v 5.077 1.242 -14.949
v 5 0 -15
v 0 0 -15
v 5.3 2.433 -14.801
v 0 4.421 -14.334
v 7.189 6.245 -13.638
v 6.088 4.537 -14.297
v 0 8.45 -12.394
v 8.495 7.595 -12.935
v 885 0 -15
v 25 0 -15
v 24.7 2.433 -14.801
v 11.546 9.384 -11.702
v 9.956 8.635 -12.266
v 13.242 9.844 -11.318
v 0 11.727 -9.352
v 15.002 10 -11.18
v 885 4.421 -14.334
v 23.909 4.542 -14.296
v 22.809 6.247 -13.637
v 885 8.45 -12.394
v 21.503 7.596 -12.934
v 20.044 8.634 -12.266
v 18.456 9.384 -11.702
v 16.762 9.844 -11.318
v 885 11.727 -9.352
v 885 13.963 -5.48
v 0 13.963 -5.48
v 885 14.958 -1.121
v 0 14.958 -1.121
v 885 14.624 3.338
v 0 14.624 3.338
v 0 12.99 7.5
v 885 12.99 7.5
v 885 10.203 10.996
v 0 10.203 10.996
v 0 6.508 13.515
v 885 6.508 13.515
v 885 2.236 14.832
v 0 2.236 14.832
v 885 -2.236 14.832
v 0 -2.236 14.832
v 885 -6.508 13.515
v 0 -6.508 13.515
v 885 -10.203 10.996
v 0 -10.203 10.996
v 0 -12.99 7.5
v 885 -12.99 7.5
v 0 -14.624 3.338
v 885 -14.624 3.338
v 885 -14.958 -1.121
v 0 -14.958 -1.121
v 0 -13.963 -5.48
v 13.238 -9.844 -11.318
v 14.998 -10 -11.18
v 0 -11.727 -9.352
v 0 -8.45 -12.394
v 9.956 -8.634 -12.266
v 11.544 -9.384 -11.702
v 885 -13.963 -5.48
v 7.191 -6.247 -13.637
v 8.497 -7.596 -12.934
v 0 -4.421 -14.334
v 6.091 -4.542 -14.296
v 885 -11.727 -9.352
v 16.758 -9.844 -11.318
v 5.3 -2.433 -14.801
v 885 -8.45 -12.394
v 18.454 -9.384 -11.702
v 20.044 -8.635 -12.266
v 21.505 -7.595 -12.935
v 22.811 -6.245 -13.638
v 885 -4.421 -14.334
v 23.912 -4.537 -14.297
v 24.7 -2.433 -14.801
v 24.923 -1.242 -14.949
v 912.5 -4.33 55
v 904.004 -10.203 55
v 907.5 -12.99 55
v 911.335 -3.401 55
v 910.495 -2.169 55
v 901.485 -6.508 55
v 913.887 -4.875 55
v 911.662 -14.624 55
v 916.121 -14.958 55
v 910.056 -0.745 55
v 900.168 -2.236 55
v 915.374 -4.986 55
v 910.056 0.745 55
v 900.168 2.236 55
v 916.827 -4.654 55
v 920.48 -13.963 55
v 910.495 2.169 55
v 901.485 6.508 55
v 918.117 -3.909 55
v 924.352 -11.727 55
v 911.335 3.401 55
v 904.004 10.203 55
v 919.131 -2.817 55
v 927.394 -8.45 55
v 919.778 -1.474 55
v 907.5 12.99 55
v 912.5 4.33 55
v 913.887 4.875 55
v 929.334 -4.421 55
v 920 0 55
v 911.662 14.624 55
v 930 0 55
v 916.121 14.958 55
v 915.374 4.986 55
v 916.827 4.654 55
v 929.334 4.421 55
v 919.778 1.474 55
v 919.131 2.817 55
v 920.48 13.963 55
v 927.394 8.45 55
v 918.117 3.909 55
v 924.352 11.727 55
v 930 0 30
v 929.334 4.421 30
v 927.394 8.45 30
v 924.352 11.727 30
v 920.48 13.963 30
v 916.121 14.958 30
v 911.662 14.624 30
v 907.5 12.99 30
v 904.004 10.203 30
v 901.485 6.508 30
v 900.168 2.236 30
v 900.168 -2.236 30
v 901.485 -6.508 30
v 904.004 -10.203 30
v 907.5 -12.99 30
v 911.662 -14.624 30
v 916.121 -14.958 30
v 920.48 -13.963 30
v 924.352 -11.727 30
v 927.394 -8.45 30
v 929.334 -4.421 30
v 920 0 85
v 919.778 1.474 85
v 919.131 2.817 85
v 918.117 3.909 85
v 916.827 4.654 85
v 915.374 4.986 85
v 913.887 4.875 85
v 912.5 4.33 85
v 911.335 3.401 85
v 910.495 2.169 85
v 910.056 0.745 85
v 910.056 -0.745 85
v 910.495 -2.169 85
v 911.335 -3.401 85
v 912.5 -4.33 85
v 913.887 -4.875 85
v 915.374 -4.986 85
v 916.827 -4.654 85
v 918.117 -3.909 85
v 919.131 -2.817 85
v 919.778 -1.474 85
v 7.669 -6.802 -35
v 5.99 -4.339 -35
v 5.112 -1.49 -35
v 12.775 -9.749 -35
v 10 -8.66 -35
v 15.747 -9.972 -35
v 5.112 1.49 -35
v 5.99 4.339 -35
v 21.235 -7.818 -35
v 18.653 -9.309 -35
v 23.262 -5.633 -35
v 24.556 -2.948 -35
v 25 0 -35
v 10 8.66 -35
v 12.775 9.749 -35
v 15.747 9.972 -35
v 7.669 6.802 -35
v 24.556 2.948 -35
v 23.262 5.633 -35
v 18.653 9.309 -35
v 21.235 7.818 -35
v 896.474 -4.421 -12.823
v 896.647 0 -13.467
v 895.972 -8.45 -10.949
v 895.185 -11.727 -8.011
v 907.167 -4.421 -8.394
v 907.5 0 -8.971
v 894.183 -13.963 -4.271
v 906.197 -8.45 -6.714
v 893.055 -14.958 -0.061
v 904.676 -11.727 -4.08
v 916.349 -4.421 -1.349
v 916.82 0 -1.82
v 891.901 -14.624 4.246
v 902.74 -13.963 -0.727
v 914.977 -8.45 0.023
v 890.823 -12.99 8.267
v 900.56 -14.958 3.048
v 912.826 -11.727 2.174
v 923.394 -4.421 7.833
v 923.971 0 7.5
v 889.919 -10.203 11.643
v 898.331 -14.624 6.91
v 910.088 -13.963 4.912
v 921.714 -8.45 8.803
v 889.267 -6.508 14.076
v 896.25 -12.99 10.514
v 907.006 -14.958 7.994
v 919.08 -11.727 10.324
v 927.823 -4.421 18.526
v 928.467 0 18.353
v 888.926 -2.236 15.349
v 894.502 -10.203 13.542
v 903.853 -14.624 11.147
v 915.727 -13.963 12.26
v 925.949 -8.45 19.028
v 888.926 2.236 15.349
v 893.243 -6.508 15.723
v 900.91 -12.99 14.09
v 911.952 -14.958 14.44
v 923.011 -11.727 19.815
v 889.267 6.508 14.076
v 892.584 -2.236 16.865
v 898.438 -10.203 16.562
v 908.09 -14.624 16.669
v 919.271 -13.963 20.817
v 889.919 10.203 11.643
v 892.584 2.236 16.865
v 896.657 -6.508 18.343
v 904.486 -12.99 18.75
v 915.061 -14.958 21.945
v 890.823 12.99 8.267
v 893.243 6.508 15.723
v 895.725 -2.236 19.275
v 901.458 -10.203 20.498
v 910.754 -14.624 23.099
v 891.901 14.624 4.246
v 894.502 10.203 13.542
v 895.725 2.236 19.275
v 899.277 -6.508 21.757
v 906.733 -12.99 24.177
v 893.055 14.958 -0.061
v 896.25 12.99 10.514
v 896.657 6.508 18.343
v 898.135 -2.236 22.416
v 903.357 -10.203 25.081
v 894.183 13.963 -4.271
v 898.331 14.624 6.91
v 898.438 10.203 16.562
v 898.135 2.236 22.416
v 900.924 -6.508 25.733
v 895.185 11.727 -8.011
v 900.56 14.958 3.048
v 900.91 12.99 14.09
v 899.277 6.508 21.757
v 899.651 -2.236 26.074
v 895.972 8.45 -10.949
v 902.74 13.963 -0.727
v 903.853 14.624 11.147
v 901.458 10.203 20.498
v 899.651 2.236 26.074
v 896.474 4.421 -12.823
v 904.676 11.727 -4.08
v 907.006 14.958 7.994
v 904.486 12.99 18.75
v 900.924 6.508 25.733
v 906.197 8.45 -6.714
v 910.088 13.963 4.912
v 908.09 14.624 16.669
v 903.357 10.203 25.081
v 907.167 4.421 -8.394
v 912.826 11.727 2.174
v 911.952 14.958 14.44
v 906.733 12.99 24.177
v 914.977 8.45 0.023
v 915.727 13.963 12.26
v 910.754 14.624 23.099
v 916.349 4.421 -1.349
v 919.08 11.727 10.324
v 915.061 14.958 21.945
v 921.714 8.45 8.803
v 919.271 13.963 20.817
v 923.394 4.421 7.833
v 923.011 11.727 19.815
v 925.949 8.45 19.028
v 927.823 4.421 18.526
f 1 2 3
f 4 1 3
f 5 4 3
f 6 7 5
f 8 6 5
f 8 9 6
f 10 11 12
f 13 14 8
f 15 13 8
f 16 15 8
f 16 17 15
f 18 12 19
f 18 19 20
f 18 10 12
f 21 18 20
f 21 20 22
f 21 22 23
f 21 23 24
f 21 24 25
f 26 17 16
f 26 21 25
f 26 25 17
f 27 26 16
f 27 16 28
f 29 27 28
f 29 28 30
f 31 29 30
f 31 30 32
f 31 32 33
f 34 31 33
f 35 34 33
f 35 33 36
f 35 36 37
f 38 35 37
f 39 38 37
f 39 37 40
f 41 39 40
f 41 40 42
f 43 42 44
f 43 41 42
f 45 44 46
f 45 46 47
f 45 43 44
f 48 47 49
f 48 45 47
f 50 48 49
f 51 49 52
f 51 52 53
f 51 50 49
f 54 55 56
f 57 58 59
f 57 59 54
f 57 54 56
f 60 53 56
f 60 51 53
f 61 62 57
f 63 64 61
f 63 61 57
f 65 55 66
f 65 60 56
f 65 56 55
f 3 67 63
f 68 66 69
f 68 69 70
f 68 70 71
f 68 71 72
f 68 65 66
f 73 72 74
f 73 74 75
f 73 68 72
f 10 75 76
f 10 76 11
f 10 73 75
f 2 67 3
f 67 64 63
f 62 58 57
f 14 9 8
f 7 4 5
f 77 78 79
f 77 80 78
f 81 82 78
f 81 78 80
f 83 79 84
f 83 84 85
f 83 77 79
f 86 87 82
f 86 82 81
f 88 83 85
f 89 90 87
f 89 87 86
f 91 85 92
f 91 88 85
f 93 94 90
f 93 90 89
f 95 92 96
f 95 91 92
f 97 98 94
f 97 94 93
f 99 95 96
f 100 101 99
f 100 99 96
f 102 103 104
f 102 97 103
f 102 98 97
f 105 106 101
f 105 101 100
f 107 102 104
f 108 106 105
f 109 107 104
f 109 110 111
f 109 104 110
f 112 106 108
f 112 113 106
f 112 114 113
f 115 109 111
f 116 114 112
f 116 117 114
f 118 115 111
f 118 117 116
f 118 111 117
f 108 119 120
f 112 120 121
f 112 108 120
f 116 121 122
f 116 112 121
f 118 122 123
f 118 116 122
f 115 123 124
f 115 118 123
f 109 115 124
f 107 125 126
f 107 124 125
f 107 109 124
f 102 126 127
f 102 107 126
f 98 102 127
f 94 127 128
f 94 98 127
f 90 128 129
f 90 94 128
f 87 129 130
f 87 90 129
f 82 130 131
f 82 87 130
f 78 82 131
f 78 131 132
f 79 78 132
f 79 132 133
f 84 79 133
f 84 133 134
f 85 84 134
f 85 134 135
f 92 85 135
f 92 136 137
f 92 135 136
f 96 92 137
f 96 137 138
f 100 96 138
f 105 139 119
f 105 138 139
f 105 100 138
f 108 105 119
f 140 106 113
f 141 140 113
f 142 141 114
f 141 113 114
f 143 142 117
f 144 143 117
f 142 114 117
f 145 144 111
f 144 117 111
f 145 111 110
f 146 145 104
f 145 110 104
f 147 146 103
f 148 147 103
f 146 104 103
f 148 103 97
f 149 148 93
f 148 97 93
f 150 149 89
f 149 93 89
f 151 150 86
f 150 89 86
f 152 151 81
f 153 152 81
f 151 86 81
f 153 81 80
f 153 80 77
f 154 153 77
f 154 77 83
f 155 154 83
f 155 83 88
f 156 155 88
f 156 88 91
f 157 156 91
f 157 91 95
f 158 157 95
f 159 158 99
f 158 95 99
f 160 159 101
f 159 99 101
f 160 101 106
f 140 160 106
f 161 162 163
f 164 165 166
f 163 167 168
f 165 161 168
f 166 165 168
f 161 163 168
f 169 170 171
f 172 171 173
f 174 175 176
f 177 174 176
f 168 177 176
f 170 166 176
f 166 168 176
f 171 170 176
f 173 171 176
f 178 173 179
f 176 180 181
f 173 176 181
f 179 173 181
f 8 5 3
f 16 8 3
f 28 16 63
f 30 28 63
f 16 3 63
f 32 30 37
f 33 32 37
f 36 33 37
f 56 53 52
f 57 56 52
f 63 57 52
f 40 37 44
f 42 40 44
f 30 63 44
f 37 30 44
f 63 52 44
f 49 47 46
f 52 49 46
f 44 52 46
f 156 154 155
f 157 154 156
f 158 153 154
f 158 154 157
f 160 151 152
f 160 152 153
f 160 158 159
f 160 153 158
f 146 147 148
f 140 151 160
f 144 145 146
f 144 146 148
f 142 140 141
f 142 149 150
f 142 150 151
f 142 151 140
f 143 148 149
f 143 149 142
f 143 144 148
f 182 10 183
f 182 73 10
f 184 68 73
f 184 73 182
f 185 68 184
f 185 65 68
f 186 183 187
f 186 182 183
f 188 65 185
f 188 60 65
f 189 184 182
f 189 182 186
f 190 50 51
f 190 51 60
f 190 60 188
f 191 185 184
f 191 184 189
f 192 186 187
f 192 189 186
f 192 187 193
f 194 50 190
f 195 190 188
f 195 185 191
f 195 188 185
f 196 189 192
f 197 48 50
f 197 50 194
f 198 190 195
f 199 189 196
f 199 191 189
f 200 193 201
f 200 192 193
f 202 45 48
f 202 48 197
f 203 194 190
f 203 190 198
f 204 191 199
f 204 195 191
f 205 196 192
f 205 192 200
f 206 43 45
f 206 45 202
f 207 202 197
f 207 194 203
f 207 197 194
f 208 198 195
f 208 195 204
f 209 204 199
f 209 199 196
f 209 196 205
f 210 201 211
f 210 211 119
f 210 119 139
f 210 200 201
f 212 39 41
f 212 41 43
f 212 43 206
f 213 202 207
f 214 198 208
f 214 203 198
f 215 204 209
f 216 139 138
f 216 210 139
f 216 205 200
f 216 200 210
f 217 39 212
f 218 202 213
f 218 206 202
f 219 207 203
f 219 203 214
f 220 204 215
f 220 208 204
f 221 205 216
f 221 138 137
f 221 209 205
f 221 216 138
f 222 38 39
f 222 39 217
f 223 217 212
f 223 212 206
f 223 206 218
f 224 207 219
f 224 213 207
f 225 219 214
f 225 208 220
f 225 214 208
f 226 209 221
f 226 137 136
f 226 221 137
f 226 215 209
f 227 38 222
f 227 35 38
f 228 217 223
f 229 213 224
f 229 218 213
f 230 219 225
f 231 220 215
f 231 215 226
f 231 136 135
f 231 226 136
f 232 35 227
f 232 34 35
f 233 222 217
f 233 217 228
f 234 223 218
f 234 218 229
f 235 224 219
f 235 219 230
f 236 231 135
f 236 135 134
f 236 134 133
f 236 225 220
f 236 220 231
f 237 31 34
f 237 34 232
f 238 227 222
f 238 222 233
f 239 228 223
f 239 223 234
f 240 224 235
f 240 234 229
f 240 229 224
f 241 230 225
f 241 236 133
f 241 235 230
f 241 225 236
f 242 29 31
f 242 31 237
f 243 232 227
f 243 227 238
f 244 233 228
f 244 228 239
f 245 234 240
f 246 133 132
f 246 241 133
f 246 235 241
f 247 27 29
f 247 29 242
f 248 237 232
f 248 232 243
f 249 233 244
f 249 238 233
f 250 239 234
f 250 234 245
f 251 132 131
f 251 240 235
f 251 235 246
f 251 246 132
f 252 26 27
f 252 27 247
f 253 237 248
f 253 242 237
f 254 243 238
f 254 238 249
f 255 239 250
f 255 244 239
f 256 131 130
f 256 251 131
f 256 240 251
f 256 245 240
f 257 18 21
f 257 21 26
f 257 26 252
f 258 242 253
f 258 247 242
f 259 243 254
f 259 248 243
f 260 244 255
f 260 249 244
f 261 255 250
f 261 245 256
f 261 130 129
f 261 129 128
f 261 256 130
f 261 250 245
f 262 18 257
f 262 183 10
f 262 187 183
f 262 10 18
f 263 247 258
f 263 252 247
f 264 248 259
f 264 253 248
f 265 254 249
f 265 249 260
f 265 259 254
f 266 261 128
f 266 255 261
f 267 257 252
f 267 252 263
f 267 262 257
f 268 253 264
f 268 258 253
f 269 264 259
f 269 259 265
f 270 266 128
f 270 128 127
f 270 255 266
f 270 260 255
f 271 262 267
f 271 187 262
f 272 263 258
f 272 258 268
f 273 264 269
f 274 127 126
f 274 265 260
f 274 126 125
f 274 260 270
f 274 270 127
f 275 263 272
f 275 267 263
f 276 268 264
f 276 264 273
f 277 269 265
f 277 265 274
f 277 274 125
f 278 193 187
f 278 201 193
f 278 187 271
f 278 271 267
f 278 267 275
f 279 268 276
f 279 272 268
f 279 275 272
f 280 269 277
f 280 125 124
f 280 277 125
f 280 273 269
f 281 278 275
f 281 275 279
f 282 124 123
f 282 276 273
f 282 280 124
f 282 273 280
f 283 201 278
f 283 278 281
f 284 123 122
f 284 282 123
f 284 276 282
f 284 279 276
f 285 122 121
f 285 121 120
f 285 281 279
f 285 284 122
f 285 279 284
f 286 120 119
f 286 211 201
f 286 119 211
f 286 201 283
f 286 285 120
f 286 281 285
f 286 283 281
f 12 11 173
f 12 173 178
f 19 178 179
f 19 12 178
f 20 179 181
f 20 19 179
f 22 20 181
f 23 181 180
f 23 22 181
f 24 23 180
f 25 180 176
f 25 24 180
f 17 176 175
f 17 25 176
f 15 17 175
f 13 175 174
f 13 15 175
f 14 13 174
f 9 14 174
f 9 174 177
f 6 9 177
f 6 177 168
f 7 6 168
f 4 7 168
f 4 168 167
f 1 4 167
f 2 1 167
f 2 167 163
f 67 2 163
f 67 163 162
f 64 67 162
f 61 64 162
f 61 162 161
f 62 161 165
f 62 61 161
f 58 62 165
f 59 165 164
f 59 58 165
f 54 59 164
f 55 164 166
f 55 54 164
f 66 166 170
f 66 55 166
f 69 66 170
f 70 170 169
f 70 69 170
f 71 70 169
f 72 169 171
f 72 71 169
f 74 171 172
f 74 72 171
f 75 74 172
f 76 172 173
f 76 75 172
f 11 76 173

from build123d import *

# Parameters (mm, degrees)
SKETCH2_R           = 15
SKETCH3_R           = 5
BOSS_EXTRUDE1_DEPTH = 30
SKETCH4_R           = 10
BOSS_EXTRUDE2_DEPTH = 35


with BuildPart() as part:
    # Sweep2: sweep along a path in Sketch1
    with BuildLine(Plane(origin=(0, 0, 0), x_dir=(1, 0, 0), z_dir=(0, 1, 0))) as sweep2_path:
        Line((0, 0), (885, 0))
        ThreePointArc((885, 0), (906.213203436, -8.786796564), (915, -30))
        Line((915, -30), (915, -55))
    # Sketch2 → Sweep2 (sweep)
    with BuildSketch(Plane(origin=(0, 0, 0), x_dir=(0, 0, -1), z_dir=(1, 0, 0))):
        Circle(SKETCH2_R)
    sweep(path=sweep2_path.line)

    # Sketch3 → Boss-Extrude1 (add)
    with BuildSketch(Plane.XY.offset(55)):
        with Locations((915, 0)):
            Circle(SKETCH3_R)
    extrude(amount=BOSS_EXTRUDE1_DEPTH)

    # Sketch4 → Boss-Extrude2 (add)
    with BuildSketch(Plane.XY):
        with Locations((15, 0)):
            Circle(SKETCH4_R)
    extrude(amount=-BOSS_EXTRUDE2_DEPTH)


solid = part.part
